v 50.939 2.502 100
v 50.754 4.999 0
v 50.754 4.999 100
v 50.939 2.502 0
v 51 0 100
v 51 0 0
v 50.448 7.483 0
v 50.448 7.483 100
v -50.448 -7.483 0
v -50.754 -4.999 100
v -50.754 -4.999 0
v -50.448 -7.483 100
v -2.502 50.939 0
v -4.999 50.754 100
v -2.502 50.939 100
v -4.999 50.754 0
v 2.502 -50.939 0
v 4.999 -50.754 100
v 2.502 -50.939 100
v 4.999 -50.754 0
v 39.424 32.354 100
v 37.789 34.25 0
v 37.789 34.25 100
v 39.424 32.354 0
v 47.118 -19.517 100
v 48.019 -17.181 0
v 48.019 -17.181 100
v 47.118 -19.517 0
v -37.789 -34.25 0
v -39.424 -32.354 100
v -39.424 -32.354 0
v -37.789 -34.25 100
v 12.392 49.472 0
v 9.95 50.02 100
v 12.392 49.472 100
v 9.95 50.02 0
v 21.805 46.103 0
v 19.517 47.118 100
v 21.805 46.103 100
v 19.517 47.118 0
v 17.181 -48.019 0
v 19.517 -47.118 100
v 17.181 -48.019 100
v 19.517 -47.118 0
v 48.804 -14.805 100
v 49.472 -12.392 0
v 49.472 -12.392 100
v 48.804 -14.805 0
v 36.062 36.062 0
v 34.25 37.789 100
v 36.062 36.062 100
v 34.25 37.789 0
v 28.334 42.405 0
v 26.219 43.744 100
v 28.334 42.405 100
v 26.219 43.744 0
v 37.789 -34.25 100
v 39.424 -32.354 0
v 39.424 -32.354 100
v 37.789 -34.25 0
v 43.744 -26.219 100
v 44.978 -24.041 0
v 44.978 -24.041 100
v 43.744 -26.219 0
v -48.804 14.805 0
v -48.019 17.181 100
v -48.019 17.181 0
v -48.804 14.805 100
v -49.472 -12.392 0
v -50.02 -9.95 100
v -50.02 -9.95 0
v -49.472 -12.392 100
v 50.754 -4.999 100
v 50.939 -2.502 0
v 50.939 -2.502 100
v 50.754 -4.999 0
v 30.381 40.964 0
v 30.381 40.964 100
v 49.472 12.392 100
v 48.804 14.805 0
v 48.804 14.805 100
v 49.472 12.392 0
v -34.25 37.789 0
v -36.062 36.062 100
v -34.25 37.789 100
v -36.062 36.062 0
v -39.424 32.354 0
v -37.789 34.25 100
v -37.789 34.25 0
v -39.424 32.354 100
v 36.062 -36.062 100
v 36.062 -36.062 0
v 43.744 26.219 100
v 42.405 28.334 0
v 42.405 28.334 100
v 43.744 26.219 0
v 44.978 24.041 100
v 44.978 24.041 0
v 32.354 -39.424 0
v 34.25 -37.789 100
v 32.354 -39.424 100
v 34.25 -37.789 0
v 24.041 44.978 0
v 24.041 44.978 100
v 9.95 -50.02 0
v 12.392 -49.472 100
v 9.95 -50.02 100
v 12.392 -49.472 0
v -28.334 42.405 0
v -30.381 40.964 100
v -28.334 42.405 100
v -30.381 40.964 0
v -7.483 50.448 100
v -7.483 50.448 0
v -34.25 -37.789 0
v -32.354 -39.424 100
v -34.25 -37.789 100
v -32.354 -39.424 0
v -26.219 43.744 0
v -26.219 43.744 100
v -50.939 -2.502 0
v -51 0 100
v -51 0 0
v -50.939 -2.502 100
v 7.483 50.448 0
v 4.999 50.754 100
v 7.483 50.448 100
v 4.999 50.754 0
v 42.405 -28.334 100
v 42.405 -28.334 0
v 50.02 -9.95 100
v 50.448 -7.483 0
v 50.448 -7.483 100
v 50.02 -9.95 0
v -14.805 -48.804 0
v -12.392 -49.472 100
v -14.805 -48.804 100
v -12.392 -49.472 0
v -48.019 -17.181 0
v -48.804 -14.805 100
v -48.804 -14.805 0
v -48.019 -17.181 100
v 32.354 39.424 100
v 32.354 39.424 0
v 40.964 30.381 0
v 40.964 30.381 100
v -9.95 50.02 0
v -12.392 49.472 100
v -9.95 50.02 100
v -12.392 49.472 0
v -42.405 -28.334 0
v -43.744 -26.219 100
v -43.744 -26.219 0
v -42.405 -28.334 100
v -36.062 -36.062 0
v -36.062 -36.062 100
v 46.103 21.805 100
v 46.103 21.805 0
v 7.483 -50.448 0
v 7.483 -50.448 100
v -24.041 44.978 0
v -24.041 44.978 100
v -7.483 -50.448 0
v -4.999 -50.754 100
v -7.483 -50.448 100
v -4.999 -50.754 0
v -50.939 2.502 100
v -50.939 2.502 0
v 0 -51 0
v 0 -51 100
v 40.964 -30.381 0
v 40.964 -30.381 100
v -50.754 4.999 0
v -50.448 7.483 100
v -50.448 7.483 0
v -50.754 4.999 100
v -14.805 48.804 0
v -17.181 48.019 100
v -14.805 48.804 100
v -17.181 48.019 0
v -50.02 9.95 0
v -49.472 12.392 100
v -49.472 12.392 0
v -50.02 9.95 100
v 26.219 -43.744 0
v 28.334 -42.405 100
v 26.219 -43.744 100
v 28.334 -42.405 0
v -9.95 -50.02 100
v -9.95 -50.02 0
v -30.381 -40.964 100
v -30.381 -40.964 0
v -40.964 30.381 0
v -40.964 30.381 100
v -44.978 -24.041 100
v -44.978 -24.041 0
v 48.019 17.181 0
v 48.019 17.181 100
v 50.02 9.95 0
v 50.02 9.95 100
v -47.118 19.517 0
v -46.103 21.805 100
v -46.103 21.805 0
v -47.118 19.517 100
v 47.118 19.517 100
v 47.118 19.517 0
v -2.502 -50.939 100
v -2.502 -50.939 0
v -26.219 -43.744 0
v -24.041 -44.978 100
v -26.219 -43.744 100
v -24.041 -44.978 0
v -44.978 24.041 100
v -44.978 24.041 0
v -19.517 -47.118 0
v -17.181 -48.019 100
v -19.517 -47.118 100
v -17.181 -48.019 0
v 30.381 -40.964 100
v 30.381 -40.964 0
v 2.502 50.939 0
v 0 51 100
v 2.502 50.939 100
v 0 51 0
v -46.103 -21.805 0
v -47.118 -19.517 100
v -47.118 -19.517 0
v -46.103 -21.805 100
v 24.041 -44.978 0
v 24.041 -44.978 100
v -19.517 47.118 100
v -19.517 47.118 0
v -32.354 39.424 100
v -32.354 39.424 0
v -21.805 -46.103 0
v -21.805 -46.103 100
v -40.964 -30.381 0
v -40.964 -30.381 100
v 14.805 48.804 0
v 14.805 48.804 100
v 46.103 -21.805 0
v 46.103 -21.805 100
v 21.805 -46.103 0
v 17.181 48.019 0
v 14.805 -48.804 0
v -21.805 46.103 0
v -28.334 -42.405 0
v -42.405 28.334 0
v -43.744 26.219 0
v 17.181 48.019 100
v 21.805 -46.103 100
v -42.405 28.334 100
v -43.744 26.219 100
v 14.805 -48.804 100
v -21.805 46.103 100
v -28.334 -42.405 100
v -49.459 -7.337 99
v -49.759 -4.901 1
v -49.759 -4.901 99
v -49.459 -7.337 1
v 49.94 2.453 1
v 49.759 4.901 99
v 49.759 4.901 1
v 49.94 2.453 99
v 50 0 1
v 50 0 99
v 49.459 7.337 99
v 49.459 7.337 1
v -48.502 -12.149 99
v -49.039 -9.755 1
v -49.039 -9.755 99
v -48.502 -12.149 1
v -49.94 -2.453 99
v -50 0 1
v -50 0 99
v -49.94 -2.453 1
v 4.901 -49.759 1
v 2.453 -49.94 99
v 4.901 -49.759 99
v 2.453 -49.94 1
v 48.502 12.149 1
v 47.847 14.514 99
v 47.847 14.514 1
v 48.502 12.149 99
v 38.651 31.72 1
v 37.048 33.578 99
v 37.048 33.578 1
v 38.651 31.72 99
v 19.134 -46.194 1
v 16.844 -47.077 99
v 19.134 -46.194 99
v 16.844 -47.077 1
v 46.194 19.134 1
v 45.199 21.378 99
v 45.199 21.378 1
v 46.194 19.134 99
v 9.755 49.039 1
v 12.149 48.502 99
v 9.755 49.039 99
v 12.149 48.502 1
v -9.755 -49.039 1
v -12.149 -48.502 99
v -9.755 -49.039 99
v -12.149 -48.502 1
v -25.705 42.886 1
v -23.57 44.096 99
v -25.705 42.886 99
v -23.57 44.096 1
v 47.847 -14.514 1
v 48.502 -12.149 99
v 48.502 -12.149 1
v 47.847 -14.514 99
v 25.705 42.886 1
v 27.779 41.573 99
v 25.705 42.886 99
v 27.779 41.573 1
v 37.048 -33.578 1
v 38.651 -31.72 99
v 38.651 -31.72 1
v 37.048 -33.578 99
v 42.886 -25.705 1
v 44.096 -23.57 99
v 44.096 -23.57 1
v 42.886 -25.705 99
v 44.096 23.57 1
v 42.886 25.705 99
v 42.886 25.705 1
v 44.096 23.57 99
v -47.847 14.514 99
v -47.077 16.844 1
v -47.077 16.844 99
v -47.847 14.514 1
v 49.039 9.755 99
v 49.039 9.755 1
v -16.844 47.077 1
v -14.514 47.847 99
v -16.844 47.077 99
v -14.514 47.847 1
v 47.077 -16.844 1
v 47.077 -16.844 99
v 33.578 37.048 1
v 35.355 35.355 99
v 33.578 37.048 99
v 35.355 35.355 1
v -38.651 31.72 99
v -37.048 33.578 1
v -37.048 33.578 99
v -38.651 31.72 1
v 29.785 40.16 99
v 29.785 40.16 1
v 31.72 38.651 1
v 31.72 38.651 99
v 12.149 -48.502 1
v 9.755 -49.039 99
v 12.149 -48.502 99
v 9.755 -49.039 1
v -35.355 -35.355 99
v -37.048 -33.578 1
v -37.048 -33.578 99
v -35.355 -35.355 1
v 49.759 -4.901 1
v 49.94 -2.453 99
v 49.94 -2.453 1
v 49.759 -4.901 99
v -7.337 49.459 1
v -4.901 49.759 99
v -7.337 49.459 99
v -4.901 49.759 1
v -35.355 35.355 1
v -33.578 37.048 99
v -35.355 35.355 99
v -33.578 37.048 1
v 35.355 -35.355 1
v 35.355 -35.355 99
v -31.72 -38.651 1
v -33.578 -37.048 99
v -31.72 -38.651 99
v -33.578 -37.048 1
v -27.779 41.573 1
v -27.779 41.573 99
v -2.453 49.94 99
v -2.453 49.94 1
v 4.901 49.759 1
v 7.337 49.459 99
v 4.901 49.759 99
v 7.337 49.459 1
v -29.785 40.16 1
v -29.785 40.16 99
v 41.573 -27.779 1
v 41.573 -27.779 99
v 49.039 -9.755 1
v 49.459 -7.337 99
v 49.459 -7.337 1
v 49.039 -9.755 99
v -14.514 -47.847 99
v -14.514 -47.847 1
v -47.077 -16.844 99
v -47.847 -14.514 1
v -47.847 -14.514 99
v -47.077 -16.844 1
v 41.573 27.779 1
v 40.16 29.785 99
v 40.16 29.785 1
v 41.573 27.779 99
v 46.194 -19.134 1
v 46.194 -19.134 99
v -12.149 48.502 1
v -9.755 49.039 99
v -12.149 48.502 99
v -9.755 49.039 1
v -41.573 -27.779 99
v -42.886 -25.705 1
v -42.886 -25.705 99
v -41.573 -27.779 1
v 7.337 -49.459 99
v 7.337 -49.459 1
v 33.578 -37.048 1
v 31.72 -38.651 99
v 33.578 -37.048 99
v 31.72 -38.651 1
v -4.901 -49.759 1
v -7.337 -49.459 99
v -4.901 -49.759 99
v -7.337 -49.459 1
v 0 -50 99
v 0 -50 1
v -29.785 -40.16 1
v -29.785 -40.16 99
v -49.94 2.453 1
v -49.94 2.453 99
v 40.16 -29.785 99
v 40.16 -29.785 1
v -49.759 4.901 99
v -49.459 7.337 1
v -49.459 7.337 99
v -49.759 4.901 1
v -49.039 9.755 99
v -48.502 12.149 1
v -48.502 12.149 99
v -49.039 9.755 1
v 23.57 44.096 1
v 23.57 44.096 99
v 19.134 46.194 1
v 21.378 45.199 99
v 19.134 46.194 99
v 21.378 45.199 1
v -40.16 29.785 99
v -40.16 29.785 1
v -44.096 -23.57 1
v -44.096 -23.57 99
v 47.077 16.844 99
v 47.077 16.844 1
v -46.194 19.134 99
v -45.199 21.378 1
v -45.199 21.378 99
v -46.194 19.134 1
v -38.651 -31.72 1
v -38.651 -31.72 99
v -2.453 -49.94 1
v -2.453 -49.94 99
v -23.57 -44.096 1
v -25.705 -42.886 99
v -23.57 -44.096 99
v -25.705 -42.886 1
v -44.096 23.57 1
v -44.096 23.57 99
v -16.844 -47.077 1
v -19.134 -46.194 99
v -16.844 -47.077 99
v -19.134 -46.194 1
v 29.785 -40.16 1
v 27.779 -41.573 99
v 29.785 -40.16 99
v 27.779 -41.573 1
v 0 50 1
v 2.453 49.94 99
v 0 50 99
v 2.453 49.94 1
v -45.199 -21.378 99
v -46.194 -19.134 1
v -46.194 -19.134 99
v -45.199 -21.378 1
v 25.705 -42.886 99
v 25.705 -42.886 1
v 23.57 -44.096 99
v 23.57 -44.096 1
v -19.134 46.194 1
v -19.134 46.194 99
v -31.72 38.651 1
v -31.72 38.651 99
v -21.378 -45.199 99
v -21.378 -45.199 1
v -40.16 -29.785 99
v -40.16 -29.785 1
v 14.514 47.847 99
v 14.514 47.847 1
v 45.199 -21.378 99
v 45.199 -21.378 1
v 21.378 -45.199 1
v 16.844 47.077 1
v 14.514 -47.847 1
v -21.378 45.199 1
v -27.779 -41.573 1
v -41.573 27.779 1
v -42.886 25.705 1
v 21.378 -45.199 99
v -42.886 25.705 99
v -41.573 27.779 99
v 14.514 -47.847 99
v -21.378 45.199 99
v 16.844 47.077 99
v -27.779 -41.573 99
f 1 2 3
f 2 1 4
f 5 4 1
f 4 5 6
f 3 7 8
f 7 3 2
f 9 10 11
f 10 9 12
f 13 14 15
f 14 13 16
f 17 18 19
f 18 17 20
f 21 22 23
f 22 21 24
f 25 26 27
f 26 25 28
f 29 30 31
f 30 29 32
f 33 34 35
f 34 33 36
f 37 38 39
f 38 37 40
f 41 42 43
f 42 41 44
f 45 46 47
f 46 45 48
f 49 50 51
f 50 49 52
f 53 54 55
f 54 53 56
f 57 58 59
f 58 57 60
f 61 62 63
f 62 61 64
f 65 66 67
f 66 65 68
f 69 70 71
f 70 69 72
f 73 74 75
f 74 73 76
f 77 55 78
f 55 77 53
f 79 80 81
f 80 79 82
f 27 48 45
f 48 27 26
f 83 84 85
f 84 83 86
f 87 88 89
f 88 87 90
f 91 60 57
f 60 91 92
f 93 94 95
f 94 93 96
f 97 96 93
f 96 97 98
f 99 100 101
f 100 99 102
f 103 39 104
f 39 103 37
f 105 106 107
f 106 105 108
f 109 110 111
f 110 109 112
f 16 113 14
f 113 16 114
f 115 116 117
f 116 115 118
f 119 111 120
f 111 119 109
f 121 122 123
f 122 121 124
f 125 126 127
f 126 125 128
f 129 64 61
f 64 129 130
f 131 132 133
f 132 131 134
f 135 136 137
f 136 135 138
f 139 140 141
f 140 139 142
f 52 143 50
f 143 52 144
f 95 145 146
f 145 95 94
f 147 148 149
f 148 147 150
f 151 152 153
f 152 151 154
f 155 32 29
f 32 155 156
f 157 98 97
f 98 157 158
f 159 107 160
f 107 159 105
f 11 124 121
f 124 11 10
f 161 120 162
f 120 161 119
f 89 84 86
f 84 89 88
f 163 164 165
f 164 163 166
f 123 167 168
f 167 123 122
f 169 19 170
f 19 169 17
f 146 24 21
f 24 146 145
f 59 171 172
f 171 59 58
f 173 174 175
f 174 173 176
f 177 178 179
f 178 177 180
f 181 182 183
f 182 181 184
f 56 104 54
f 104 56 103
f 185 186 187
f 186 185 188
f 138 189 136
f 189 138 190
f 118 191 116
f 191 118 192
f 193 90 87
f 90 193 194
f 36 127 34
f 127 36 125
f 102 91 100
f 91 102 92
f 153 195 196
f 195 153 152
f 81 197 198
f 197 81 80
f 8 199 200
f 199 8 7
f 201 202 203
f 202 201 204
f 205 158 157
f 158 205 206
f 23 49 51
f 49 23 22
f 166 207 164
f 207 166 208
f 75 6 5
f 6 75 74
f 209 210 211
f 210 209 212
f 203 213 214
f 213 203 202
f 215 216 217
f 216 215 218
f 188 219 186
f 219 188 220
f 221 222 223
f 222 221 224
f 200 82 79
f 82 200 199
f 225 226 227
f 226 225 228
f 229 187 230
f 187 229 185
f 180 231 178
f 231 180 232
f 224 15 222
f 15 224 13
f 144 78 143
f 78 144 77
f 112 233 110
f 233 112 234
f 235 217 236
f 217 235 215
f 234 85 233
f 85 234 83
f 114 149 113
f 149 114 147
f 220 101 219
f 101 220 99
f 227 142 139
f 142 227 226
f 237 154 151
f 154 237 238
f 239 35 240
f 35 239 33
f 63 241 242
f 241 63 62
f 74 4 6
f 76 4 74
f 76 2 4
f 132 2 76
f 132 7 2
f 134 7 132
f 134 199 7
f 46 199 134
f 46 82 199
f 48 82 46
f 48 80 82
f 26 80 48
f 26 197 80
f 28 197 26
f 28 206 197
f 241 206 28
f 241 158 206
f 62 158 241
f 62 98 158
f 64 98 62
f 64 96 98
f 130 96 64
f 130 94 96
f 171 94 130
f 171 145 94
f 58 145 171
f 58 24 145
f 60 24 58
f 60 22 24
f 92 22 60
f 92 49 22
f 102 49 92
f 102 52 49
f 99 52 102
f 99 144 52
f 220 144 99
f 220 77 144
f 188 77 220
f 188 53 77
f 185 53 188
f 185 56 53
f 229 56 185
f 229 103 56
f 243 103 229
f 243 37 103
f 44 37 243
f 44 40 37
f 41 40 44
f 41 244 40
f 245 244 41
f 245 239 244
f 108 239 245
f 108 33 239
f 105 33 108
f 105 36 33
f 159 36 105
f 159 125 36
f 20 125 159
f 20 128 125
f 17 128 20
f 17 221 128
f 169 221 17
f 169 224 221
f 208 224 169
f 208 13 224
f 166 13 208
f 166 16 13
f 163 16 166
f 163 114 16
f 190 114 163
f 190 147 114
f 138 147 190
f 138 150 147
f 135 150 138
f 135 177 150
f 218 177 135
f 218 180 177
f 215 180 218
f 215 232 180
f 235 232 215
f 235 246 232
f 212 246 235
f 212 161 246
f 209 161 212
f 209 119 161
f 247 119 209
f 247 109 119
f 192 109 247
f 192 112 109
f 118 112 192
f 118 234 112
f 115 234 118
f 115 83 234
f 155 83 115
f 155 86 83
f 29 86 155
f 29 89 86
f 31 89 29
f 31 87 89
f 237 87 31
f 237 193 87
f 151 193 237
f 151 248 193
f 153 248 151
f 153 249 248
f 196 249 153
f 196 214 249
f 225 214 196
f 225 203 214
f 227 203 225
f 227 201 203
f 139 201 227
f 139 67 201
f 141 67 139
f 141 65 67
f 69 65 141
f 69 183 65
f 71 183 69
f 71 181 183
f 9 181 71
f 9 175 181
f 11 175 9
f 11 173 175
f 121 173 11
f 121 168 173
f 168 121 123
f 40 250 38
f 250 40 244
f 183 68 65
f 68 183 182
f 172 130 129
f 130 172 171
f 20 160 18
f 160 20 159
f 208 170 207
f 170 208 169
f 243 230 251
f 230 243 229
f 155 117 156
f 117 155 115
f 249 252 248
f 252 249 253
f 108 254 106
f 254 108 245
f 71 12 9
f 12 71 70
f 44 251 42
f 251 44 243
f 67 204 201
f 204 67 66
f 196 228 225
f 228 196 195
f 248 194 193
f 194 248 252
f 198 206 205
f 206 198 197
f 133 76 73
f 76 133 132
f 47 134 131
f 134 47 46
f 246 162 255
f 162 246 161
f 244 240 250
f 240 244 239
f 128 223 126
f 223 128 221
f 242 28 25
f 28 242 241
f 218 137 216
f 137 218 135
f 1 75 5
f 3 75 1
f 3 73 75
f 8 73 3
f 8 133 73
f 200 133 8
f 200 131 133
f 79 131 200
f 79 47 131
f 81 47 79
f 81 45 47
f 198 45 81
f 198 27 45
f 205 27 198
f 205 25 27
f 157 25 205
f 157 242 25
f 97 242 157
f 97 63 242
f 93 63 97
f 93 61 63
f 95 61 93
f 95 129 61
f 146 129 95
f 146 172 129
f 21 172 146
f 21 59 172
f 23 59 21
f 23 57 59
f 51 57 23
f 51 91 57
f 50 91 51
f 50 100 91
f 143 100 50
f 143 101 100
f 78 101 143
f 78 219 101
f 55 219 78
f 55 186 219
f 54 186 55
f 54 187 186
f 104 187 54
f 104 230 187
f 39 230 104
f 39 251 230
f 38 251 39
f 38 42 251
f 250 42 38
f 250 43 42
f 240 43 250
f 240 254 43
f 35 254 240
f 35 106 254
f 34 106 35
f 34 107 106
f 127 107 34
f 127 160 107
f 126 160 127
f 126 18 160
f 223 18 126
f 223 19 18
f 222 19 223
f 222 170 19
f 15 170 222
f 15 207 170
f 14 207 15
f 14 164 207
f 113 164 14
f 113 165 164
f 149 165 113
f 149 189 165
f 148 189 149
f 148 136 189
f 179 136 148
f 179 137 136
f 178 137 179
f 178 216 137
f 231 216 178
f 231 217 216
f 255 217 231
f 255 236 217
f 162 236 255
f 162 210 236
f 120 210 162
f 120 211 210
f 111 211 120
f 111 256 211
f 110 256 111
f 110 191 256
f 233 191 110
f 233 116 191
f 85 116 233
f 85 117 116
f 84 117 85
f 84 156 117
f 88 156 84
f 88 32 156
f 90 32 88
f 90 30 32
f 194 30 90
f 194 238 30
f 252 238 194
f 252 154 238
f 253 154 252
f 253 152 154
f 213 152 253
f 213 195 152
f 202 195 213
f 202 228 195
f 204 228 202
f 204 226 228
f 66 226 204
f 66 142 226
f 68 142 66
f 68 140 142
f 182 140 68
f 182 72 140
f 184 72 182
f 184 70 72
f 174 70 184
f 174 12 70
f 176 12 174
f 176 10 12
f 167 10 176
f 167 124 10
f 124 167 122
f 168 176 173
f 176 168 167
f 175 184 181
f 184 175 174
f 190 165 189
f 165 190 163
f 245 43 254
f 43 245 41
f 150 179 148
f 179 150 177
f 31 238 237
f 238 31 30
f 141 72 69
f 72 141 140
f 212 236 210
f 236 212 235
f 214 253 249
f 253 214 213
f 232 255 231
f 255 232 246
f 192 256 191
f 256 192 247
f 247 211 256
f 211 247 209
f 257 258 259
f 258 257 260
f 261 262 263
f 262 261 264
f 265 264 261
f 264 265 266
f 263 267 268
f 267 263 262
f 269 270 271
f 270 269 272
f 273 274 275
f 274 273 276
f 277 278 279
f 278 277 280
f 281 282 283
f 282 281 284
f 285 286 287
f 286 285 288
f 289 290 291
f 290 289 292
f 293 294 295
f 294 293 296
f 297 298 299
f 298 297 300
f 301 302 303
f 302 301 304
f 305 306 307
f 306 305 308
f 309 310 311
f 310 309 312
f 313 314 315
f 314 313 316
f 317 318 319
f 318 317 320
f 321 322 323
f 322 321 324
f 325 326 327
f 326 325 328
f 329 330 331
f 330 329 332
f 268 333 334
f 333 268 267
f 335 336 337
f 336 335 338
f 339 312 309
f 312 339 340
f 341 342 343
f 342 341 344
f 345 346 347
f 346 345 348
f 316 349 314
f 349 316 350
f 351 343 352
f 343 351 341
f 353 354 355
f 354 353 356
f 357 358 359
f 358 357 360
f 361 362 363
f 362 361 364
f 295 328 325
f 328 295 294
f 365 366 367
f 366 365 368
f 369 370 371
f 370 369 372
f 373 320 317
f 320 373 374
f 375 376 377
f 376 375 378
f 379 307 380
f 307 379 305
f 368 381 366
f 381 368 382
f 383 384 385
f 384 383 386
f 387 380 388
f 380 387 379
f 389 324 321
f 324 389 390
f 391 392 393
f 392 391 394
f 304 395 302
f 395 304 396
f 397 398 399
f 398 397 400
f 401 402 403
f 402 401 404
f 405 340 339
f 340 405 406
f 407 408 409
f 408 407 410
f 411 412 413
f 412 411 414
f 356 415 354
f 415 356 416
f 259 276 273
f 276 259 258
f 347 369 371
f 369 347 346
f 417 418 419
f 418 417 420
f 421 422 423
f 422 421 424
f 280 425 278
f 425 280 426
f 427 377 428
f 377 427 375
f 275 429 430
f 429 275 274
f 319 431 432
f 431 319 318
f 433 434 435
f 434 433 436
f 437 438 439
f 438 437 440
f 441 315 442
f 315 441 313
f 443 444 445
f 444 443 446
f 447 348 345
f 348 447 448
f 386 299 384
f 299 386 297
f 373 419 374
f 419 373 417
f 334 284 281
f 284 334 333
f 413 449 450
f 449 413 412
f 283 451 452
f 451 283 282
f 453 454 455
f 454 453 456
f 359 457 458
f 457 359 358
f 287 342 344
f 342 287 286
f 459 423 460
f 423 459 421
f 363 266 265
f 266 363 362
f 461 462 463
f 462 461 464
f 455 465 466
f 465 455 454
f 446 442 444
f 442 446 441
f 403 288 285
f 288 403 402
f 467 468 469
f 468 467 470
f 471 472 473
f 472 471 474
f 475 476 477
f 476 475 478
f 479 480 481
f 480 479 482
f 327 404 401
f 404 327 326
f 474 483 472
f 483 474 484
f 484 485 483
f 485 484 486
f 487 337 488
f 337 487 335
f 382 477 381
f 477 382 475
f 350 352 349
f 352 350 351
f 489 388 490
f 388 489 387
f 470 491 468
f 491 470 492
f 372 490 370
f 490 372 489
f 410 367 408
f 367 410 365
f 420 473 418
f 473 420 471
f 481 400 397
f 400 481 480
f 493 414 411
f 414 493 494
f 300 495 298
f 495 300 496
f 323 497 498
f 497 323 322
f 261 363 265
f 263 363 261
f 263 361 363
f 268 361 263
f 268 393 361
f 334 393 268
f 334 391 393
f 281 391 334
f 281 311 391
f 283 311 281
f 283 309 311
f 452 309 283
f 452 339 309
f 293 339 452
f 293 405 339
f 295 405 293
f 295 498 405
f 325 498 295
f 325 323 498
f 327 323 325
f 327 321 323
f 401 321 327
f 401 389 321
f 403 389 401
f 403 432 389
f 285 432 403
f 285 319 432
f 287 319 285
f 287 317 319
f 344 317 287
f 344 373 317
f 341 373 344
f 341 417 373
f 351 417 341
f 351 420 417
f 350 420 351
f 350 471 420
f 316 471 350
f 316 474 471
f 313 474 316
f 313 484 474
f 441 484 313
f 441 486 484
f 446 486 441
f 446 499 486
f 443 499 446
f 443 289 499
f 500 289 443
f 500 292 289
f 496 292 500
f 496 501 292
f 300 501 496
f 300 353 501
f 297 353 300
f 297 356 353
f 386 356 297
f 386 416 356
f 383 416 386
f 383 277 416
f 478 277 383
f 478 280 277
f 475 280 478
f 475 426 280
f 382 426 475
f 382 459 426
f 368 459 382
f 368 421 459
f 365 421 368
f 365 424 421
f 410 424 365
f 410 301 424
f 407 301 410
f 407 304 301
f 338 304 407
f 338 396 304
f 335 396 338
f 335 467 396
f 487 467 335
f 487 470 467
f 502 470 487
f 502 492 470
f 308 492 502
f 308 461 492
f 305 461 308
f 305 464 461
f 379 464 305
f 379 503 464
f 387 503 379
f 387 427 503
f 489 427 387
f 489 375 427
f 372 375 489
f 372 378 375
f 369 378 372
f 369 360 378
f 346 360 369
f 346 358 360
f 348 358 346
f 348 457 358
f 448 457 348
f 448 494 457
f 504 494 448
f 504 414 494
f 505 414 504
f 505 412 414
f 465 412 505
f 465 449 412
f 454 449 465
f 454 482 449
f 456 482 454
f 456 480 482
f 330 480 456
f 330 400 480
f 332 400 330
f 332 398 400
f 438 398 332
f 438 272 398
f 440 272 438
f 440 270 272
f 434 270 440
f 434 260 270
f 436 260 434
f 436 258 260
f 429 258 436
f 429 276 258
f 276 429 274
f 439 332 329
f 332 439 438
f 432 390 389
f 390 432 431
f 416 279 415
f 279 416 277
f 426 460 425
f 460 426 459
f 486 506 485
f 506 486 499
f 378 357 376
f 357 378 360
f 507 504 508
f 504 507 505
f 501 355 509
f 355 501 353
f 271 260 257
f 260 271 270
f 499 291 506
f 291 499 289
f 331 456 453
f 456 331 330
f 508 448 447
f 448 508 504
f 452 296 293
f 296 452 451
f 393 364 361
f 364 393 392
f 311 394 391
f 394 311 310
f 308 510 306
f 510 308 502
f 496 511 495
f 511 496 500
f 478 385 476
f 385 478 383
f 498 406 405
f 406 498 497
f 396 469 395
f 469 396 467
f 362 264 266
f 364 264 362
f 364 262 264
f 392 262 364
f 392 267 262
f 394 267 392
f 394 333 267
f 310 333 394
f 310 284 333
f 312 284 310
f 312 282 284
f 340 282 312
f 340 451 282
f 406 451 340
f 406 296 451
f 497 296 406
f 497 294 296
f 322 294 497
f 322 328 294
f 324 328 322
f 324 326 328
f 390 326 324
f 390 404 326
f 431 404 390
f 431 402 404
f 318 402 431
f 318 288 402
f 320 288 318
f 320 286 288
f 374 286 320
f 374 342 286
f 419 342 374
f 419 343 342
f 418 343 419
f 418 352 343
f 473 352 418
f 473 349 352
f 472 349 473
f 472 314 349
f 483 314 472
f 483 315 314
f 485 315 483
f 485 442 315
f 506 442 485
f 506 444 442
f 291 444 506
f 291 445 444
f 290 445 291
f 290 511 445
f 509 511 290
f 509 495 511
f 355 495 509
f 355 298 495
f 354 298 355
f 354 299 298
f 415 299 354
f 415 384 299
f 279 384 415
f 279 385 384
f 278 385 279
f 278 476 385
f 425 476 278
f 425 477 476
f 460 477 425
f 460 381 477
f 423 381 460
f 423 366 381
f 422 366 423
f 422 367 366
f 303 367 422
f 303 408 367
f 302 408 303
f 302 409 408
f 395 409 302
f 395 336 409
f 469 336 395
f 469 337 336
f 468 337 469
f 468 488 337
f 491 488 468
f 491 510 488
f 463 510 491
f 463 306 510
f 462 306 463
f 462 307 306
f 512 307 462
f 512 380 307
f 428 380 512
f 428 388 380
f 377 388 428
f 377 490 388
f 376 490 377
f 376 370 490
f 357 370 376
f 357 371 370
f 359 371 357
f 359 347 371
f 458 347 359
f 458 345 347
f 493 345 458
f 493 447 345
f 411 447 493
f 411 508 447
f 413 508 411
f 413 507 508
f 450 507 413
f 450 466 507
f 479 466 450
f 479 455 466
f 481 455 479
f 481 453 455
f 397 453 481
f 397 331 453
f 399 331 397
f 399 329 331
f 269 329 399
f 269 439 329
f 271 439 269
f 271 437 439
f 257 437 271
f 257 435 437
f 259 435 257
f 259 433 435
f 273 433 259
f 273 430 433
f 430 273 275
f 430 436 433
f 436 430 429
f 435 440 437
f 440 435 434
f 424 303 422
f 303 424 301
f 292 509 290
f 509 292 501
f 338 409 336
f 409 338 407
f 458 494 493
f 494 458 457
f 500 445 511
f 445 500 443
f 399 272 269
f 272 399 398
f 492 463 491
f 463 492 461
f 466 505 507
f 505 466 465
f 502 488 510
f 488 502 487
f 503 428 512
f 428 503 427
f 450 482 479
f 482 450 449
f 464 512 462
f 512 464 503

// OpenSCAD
// Thin-walled pressurised cylindrical bottle, operating above PLA's glass
// transition.
//
// Demonstrates: pressure_vessel_hoop WARN (stress between safety threshold
// and yield) and operating_temperature BLOCK (PLA at 70 °C is past Tg and
// loses structural strength entirely). A real water bottle made out of PLA
// at this size, this pressure, and this temperature would not survive —
// the warnings catch it before it ships.
//
// part: bottle
// gravity: -z
// operating: temp_c=70
// pressure: part=bottle internal_pa=600000 wall_thickness_mm=1 radius_mm=50 material=PLA

inner_radius   = 50;
wall_thickness = 1;
height         = 100;

module bottle() {
    difference() {
        cylinder(h=height, r=inner_radius + wall_thickness, $fn=128);
        // Inner cavity stops short of the top and bottom faces so the
        // bottle is actually sealed (the mesh is watertight).
        translate([0, 0, wall_thickness])
            cylinder(h=height - 2 * wall_thickness, r=inner_radius, $fn=128);
    }
}

module assembly() {
    bottle();
}

assembly();
